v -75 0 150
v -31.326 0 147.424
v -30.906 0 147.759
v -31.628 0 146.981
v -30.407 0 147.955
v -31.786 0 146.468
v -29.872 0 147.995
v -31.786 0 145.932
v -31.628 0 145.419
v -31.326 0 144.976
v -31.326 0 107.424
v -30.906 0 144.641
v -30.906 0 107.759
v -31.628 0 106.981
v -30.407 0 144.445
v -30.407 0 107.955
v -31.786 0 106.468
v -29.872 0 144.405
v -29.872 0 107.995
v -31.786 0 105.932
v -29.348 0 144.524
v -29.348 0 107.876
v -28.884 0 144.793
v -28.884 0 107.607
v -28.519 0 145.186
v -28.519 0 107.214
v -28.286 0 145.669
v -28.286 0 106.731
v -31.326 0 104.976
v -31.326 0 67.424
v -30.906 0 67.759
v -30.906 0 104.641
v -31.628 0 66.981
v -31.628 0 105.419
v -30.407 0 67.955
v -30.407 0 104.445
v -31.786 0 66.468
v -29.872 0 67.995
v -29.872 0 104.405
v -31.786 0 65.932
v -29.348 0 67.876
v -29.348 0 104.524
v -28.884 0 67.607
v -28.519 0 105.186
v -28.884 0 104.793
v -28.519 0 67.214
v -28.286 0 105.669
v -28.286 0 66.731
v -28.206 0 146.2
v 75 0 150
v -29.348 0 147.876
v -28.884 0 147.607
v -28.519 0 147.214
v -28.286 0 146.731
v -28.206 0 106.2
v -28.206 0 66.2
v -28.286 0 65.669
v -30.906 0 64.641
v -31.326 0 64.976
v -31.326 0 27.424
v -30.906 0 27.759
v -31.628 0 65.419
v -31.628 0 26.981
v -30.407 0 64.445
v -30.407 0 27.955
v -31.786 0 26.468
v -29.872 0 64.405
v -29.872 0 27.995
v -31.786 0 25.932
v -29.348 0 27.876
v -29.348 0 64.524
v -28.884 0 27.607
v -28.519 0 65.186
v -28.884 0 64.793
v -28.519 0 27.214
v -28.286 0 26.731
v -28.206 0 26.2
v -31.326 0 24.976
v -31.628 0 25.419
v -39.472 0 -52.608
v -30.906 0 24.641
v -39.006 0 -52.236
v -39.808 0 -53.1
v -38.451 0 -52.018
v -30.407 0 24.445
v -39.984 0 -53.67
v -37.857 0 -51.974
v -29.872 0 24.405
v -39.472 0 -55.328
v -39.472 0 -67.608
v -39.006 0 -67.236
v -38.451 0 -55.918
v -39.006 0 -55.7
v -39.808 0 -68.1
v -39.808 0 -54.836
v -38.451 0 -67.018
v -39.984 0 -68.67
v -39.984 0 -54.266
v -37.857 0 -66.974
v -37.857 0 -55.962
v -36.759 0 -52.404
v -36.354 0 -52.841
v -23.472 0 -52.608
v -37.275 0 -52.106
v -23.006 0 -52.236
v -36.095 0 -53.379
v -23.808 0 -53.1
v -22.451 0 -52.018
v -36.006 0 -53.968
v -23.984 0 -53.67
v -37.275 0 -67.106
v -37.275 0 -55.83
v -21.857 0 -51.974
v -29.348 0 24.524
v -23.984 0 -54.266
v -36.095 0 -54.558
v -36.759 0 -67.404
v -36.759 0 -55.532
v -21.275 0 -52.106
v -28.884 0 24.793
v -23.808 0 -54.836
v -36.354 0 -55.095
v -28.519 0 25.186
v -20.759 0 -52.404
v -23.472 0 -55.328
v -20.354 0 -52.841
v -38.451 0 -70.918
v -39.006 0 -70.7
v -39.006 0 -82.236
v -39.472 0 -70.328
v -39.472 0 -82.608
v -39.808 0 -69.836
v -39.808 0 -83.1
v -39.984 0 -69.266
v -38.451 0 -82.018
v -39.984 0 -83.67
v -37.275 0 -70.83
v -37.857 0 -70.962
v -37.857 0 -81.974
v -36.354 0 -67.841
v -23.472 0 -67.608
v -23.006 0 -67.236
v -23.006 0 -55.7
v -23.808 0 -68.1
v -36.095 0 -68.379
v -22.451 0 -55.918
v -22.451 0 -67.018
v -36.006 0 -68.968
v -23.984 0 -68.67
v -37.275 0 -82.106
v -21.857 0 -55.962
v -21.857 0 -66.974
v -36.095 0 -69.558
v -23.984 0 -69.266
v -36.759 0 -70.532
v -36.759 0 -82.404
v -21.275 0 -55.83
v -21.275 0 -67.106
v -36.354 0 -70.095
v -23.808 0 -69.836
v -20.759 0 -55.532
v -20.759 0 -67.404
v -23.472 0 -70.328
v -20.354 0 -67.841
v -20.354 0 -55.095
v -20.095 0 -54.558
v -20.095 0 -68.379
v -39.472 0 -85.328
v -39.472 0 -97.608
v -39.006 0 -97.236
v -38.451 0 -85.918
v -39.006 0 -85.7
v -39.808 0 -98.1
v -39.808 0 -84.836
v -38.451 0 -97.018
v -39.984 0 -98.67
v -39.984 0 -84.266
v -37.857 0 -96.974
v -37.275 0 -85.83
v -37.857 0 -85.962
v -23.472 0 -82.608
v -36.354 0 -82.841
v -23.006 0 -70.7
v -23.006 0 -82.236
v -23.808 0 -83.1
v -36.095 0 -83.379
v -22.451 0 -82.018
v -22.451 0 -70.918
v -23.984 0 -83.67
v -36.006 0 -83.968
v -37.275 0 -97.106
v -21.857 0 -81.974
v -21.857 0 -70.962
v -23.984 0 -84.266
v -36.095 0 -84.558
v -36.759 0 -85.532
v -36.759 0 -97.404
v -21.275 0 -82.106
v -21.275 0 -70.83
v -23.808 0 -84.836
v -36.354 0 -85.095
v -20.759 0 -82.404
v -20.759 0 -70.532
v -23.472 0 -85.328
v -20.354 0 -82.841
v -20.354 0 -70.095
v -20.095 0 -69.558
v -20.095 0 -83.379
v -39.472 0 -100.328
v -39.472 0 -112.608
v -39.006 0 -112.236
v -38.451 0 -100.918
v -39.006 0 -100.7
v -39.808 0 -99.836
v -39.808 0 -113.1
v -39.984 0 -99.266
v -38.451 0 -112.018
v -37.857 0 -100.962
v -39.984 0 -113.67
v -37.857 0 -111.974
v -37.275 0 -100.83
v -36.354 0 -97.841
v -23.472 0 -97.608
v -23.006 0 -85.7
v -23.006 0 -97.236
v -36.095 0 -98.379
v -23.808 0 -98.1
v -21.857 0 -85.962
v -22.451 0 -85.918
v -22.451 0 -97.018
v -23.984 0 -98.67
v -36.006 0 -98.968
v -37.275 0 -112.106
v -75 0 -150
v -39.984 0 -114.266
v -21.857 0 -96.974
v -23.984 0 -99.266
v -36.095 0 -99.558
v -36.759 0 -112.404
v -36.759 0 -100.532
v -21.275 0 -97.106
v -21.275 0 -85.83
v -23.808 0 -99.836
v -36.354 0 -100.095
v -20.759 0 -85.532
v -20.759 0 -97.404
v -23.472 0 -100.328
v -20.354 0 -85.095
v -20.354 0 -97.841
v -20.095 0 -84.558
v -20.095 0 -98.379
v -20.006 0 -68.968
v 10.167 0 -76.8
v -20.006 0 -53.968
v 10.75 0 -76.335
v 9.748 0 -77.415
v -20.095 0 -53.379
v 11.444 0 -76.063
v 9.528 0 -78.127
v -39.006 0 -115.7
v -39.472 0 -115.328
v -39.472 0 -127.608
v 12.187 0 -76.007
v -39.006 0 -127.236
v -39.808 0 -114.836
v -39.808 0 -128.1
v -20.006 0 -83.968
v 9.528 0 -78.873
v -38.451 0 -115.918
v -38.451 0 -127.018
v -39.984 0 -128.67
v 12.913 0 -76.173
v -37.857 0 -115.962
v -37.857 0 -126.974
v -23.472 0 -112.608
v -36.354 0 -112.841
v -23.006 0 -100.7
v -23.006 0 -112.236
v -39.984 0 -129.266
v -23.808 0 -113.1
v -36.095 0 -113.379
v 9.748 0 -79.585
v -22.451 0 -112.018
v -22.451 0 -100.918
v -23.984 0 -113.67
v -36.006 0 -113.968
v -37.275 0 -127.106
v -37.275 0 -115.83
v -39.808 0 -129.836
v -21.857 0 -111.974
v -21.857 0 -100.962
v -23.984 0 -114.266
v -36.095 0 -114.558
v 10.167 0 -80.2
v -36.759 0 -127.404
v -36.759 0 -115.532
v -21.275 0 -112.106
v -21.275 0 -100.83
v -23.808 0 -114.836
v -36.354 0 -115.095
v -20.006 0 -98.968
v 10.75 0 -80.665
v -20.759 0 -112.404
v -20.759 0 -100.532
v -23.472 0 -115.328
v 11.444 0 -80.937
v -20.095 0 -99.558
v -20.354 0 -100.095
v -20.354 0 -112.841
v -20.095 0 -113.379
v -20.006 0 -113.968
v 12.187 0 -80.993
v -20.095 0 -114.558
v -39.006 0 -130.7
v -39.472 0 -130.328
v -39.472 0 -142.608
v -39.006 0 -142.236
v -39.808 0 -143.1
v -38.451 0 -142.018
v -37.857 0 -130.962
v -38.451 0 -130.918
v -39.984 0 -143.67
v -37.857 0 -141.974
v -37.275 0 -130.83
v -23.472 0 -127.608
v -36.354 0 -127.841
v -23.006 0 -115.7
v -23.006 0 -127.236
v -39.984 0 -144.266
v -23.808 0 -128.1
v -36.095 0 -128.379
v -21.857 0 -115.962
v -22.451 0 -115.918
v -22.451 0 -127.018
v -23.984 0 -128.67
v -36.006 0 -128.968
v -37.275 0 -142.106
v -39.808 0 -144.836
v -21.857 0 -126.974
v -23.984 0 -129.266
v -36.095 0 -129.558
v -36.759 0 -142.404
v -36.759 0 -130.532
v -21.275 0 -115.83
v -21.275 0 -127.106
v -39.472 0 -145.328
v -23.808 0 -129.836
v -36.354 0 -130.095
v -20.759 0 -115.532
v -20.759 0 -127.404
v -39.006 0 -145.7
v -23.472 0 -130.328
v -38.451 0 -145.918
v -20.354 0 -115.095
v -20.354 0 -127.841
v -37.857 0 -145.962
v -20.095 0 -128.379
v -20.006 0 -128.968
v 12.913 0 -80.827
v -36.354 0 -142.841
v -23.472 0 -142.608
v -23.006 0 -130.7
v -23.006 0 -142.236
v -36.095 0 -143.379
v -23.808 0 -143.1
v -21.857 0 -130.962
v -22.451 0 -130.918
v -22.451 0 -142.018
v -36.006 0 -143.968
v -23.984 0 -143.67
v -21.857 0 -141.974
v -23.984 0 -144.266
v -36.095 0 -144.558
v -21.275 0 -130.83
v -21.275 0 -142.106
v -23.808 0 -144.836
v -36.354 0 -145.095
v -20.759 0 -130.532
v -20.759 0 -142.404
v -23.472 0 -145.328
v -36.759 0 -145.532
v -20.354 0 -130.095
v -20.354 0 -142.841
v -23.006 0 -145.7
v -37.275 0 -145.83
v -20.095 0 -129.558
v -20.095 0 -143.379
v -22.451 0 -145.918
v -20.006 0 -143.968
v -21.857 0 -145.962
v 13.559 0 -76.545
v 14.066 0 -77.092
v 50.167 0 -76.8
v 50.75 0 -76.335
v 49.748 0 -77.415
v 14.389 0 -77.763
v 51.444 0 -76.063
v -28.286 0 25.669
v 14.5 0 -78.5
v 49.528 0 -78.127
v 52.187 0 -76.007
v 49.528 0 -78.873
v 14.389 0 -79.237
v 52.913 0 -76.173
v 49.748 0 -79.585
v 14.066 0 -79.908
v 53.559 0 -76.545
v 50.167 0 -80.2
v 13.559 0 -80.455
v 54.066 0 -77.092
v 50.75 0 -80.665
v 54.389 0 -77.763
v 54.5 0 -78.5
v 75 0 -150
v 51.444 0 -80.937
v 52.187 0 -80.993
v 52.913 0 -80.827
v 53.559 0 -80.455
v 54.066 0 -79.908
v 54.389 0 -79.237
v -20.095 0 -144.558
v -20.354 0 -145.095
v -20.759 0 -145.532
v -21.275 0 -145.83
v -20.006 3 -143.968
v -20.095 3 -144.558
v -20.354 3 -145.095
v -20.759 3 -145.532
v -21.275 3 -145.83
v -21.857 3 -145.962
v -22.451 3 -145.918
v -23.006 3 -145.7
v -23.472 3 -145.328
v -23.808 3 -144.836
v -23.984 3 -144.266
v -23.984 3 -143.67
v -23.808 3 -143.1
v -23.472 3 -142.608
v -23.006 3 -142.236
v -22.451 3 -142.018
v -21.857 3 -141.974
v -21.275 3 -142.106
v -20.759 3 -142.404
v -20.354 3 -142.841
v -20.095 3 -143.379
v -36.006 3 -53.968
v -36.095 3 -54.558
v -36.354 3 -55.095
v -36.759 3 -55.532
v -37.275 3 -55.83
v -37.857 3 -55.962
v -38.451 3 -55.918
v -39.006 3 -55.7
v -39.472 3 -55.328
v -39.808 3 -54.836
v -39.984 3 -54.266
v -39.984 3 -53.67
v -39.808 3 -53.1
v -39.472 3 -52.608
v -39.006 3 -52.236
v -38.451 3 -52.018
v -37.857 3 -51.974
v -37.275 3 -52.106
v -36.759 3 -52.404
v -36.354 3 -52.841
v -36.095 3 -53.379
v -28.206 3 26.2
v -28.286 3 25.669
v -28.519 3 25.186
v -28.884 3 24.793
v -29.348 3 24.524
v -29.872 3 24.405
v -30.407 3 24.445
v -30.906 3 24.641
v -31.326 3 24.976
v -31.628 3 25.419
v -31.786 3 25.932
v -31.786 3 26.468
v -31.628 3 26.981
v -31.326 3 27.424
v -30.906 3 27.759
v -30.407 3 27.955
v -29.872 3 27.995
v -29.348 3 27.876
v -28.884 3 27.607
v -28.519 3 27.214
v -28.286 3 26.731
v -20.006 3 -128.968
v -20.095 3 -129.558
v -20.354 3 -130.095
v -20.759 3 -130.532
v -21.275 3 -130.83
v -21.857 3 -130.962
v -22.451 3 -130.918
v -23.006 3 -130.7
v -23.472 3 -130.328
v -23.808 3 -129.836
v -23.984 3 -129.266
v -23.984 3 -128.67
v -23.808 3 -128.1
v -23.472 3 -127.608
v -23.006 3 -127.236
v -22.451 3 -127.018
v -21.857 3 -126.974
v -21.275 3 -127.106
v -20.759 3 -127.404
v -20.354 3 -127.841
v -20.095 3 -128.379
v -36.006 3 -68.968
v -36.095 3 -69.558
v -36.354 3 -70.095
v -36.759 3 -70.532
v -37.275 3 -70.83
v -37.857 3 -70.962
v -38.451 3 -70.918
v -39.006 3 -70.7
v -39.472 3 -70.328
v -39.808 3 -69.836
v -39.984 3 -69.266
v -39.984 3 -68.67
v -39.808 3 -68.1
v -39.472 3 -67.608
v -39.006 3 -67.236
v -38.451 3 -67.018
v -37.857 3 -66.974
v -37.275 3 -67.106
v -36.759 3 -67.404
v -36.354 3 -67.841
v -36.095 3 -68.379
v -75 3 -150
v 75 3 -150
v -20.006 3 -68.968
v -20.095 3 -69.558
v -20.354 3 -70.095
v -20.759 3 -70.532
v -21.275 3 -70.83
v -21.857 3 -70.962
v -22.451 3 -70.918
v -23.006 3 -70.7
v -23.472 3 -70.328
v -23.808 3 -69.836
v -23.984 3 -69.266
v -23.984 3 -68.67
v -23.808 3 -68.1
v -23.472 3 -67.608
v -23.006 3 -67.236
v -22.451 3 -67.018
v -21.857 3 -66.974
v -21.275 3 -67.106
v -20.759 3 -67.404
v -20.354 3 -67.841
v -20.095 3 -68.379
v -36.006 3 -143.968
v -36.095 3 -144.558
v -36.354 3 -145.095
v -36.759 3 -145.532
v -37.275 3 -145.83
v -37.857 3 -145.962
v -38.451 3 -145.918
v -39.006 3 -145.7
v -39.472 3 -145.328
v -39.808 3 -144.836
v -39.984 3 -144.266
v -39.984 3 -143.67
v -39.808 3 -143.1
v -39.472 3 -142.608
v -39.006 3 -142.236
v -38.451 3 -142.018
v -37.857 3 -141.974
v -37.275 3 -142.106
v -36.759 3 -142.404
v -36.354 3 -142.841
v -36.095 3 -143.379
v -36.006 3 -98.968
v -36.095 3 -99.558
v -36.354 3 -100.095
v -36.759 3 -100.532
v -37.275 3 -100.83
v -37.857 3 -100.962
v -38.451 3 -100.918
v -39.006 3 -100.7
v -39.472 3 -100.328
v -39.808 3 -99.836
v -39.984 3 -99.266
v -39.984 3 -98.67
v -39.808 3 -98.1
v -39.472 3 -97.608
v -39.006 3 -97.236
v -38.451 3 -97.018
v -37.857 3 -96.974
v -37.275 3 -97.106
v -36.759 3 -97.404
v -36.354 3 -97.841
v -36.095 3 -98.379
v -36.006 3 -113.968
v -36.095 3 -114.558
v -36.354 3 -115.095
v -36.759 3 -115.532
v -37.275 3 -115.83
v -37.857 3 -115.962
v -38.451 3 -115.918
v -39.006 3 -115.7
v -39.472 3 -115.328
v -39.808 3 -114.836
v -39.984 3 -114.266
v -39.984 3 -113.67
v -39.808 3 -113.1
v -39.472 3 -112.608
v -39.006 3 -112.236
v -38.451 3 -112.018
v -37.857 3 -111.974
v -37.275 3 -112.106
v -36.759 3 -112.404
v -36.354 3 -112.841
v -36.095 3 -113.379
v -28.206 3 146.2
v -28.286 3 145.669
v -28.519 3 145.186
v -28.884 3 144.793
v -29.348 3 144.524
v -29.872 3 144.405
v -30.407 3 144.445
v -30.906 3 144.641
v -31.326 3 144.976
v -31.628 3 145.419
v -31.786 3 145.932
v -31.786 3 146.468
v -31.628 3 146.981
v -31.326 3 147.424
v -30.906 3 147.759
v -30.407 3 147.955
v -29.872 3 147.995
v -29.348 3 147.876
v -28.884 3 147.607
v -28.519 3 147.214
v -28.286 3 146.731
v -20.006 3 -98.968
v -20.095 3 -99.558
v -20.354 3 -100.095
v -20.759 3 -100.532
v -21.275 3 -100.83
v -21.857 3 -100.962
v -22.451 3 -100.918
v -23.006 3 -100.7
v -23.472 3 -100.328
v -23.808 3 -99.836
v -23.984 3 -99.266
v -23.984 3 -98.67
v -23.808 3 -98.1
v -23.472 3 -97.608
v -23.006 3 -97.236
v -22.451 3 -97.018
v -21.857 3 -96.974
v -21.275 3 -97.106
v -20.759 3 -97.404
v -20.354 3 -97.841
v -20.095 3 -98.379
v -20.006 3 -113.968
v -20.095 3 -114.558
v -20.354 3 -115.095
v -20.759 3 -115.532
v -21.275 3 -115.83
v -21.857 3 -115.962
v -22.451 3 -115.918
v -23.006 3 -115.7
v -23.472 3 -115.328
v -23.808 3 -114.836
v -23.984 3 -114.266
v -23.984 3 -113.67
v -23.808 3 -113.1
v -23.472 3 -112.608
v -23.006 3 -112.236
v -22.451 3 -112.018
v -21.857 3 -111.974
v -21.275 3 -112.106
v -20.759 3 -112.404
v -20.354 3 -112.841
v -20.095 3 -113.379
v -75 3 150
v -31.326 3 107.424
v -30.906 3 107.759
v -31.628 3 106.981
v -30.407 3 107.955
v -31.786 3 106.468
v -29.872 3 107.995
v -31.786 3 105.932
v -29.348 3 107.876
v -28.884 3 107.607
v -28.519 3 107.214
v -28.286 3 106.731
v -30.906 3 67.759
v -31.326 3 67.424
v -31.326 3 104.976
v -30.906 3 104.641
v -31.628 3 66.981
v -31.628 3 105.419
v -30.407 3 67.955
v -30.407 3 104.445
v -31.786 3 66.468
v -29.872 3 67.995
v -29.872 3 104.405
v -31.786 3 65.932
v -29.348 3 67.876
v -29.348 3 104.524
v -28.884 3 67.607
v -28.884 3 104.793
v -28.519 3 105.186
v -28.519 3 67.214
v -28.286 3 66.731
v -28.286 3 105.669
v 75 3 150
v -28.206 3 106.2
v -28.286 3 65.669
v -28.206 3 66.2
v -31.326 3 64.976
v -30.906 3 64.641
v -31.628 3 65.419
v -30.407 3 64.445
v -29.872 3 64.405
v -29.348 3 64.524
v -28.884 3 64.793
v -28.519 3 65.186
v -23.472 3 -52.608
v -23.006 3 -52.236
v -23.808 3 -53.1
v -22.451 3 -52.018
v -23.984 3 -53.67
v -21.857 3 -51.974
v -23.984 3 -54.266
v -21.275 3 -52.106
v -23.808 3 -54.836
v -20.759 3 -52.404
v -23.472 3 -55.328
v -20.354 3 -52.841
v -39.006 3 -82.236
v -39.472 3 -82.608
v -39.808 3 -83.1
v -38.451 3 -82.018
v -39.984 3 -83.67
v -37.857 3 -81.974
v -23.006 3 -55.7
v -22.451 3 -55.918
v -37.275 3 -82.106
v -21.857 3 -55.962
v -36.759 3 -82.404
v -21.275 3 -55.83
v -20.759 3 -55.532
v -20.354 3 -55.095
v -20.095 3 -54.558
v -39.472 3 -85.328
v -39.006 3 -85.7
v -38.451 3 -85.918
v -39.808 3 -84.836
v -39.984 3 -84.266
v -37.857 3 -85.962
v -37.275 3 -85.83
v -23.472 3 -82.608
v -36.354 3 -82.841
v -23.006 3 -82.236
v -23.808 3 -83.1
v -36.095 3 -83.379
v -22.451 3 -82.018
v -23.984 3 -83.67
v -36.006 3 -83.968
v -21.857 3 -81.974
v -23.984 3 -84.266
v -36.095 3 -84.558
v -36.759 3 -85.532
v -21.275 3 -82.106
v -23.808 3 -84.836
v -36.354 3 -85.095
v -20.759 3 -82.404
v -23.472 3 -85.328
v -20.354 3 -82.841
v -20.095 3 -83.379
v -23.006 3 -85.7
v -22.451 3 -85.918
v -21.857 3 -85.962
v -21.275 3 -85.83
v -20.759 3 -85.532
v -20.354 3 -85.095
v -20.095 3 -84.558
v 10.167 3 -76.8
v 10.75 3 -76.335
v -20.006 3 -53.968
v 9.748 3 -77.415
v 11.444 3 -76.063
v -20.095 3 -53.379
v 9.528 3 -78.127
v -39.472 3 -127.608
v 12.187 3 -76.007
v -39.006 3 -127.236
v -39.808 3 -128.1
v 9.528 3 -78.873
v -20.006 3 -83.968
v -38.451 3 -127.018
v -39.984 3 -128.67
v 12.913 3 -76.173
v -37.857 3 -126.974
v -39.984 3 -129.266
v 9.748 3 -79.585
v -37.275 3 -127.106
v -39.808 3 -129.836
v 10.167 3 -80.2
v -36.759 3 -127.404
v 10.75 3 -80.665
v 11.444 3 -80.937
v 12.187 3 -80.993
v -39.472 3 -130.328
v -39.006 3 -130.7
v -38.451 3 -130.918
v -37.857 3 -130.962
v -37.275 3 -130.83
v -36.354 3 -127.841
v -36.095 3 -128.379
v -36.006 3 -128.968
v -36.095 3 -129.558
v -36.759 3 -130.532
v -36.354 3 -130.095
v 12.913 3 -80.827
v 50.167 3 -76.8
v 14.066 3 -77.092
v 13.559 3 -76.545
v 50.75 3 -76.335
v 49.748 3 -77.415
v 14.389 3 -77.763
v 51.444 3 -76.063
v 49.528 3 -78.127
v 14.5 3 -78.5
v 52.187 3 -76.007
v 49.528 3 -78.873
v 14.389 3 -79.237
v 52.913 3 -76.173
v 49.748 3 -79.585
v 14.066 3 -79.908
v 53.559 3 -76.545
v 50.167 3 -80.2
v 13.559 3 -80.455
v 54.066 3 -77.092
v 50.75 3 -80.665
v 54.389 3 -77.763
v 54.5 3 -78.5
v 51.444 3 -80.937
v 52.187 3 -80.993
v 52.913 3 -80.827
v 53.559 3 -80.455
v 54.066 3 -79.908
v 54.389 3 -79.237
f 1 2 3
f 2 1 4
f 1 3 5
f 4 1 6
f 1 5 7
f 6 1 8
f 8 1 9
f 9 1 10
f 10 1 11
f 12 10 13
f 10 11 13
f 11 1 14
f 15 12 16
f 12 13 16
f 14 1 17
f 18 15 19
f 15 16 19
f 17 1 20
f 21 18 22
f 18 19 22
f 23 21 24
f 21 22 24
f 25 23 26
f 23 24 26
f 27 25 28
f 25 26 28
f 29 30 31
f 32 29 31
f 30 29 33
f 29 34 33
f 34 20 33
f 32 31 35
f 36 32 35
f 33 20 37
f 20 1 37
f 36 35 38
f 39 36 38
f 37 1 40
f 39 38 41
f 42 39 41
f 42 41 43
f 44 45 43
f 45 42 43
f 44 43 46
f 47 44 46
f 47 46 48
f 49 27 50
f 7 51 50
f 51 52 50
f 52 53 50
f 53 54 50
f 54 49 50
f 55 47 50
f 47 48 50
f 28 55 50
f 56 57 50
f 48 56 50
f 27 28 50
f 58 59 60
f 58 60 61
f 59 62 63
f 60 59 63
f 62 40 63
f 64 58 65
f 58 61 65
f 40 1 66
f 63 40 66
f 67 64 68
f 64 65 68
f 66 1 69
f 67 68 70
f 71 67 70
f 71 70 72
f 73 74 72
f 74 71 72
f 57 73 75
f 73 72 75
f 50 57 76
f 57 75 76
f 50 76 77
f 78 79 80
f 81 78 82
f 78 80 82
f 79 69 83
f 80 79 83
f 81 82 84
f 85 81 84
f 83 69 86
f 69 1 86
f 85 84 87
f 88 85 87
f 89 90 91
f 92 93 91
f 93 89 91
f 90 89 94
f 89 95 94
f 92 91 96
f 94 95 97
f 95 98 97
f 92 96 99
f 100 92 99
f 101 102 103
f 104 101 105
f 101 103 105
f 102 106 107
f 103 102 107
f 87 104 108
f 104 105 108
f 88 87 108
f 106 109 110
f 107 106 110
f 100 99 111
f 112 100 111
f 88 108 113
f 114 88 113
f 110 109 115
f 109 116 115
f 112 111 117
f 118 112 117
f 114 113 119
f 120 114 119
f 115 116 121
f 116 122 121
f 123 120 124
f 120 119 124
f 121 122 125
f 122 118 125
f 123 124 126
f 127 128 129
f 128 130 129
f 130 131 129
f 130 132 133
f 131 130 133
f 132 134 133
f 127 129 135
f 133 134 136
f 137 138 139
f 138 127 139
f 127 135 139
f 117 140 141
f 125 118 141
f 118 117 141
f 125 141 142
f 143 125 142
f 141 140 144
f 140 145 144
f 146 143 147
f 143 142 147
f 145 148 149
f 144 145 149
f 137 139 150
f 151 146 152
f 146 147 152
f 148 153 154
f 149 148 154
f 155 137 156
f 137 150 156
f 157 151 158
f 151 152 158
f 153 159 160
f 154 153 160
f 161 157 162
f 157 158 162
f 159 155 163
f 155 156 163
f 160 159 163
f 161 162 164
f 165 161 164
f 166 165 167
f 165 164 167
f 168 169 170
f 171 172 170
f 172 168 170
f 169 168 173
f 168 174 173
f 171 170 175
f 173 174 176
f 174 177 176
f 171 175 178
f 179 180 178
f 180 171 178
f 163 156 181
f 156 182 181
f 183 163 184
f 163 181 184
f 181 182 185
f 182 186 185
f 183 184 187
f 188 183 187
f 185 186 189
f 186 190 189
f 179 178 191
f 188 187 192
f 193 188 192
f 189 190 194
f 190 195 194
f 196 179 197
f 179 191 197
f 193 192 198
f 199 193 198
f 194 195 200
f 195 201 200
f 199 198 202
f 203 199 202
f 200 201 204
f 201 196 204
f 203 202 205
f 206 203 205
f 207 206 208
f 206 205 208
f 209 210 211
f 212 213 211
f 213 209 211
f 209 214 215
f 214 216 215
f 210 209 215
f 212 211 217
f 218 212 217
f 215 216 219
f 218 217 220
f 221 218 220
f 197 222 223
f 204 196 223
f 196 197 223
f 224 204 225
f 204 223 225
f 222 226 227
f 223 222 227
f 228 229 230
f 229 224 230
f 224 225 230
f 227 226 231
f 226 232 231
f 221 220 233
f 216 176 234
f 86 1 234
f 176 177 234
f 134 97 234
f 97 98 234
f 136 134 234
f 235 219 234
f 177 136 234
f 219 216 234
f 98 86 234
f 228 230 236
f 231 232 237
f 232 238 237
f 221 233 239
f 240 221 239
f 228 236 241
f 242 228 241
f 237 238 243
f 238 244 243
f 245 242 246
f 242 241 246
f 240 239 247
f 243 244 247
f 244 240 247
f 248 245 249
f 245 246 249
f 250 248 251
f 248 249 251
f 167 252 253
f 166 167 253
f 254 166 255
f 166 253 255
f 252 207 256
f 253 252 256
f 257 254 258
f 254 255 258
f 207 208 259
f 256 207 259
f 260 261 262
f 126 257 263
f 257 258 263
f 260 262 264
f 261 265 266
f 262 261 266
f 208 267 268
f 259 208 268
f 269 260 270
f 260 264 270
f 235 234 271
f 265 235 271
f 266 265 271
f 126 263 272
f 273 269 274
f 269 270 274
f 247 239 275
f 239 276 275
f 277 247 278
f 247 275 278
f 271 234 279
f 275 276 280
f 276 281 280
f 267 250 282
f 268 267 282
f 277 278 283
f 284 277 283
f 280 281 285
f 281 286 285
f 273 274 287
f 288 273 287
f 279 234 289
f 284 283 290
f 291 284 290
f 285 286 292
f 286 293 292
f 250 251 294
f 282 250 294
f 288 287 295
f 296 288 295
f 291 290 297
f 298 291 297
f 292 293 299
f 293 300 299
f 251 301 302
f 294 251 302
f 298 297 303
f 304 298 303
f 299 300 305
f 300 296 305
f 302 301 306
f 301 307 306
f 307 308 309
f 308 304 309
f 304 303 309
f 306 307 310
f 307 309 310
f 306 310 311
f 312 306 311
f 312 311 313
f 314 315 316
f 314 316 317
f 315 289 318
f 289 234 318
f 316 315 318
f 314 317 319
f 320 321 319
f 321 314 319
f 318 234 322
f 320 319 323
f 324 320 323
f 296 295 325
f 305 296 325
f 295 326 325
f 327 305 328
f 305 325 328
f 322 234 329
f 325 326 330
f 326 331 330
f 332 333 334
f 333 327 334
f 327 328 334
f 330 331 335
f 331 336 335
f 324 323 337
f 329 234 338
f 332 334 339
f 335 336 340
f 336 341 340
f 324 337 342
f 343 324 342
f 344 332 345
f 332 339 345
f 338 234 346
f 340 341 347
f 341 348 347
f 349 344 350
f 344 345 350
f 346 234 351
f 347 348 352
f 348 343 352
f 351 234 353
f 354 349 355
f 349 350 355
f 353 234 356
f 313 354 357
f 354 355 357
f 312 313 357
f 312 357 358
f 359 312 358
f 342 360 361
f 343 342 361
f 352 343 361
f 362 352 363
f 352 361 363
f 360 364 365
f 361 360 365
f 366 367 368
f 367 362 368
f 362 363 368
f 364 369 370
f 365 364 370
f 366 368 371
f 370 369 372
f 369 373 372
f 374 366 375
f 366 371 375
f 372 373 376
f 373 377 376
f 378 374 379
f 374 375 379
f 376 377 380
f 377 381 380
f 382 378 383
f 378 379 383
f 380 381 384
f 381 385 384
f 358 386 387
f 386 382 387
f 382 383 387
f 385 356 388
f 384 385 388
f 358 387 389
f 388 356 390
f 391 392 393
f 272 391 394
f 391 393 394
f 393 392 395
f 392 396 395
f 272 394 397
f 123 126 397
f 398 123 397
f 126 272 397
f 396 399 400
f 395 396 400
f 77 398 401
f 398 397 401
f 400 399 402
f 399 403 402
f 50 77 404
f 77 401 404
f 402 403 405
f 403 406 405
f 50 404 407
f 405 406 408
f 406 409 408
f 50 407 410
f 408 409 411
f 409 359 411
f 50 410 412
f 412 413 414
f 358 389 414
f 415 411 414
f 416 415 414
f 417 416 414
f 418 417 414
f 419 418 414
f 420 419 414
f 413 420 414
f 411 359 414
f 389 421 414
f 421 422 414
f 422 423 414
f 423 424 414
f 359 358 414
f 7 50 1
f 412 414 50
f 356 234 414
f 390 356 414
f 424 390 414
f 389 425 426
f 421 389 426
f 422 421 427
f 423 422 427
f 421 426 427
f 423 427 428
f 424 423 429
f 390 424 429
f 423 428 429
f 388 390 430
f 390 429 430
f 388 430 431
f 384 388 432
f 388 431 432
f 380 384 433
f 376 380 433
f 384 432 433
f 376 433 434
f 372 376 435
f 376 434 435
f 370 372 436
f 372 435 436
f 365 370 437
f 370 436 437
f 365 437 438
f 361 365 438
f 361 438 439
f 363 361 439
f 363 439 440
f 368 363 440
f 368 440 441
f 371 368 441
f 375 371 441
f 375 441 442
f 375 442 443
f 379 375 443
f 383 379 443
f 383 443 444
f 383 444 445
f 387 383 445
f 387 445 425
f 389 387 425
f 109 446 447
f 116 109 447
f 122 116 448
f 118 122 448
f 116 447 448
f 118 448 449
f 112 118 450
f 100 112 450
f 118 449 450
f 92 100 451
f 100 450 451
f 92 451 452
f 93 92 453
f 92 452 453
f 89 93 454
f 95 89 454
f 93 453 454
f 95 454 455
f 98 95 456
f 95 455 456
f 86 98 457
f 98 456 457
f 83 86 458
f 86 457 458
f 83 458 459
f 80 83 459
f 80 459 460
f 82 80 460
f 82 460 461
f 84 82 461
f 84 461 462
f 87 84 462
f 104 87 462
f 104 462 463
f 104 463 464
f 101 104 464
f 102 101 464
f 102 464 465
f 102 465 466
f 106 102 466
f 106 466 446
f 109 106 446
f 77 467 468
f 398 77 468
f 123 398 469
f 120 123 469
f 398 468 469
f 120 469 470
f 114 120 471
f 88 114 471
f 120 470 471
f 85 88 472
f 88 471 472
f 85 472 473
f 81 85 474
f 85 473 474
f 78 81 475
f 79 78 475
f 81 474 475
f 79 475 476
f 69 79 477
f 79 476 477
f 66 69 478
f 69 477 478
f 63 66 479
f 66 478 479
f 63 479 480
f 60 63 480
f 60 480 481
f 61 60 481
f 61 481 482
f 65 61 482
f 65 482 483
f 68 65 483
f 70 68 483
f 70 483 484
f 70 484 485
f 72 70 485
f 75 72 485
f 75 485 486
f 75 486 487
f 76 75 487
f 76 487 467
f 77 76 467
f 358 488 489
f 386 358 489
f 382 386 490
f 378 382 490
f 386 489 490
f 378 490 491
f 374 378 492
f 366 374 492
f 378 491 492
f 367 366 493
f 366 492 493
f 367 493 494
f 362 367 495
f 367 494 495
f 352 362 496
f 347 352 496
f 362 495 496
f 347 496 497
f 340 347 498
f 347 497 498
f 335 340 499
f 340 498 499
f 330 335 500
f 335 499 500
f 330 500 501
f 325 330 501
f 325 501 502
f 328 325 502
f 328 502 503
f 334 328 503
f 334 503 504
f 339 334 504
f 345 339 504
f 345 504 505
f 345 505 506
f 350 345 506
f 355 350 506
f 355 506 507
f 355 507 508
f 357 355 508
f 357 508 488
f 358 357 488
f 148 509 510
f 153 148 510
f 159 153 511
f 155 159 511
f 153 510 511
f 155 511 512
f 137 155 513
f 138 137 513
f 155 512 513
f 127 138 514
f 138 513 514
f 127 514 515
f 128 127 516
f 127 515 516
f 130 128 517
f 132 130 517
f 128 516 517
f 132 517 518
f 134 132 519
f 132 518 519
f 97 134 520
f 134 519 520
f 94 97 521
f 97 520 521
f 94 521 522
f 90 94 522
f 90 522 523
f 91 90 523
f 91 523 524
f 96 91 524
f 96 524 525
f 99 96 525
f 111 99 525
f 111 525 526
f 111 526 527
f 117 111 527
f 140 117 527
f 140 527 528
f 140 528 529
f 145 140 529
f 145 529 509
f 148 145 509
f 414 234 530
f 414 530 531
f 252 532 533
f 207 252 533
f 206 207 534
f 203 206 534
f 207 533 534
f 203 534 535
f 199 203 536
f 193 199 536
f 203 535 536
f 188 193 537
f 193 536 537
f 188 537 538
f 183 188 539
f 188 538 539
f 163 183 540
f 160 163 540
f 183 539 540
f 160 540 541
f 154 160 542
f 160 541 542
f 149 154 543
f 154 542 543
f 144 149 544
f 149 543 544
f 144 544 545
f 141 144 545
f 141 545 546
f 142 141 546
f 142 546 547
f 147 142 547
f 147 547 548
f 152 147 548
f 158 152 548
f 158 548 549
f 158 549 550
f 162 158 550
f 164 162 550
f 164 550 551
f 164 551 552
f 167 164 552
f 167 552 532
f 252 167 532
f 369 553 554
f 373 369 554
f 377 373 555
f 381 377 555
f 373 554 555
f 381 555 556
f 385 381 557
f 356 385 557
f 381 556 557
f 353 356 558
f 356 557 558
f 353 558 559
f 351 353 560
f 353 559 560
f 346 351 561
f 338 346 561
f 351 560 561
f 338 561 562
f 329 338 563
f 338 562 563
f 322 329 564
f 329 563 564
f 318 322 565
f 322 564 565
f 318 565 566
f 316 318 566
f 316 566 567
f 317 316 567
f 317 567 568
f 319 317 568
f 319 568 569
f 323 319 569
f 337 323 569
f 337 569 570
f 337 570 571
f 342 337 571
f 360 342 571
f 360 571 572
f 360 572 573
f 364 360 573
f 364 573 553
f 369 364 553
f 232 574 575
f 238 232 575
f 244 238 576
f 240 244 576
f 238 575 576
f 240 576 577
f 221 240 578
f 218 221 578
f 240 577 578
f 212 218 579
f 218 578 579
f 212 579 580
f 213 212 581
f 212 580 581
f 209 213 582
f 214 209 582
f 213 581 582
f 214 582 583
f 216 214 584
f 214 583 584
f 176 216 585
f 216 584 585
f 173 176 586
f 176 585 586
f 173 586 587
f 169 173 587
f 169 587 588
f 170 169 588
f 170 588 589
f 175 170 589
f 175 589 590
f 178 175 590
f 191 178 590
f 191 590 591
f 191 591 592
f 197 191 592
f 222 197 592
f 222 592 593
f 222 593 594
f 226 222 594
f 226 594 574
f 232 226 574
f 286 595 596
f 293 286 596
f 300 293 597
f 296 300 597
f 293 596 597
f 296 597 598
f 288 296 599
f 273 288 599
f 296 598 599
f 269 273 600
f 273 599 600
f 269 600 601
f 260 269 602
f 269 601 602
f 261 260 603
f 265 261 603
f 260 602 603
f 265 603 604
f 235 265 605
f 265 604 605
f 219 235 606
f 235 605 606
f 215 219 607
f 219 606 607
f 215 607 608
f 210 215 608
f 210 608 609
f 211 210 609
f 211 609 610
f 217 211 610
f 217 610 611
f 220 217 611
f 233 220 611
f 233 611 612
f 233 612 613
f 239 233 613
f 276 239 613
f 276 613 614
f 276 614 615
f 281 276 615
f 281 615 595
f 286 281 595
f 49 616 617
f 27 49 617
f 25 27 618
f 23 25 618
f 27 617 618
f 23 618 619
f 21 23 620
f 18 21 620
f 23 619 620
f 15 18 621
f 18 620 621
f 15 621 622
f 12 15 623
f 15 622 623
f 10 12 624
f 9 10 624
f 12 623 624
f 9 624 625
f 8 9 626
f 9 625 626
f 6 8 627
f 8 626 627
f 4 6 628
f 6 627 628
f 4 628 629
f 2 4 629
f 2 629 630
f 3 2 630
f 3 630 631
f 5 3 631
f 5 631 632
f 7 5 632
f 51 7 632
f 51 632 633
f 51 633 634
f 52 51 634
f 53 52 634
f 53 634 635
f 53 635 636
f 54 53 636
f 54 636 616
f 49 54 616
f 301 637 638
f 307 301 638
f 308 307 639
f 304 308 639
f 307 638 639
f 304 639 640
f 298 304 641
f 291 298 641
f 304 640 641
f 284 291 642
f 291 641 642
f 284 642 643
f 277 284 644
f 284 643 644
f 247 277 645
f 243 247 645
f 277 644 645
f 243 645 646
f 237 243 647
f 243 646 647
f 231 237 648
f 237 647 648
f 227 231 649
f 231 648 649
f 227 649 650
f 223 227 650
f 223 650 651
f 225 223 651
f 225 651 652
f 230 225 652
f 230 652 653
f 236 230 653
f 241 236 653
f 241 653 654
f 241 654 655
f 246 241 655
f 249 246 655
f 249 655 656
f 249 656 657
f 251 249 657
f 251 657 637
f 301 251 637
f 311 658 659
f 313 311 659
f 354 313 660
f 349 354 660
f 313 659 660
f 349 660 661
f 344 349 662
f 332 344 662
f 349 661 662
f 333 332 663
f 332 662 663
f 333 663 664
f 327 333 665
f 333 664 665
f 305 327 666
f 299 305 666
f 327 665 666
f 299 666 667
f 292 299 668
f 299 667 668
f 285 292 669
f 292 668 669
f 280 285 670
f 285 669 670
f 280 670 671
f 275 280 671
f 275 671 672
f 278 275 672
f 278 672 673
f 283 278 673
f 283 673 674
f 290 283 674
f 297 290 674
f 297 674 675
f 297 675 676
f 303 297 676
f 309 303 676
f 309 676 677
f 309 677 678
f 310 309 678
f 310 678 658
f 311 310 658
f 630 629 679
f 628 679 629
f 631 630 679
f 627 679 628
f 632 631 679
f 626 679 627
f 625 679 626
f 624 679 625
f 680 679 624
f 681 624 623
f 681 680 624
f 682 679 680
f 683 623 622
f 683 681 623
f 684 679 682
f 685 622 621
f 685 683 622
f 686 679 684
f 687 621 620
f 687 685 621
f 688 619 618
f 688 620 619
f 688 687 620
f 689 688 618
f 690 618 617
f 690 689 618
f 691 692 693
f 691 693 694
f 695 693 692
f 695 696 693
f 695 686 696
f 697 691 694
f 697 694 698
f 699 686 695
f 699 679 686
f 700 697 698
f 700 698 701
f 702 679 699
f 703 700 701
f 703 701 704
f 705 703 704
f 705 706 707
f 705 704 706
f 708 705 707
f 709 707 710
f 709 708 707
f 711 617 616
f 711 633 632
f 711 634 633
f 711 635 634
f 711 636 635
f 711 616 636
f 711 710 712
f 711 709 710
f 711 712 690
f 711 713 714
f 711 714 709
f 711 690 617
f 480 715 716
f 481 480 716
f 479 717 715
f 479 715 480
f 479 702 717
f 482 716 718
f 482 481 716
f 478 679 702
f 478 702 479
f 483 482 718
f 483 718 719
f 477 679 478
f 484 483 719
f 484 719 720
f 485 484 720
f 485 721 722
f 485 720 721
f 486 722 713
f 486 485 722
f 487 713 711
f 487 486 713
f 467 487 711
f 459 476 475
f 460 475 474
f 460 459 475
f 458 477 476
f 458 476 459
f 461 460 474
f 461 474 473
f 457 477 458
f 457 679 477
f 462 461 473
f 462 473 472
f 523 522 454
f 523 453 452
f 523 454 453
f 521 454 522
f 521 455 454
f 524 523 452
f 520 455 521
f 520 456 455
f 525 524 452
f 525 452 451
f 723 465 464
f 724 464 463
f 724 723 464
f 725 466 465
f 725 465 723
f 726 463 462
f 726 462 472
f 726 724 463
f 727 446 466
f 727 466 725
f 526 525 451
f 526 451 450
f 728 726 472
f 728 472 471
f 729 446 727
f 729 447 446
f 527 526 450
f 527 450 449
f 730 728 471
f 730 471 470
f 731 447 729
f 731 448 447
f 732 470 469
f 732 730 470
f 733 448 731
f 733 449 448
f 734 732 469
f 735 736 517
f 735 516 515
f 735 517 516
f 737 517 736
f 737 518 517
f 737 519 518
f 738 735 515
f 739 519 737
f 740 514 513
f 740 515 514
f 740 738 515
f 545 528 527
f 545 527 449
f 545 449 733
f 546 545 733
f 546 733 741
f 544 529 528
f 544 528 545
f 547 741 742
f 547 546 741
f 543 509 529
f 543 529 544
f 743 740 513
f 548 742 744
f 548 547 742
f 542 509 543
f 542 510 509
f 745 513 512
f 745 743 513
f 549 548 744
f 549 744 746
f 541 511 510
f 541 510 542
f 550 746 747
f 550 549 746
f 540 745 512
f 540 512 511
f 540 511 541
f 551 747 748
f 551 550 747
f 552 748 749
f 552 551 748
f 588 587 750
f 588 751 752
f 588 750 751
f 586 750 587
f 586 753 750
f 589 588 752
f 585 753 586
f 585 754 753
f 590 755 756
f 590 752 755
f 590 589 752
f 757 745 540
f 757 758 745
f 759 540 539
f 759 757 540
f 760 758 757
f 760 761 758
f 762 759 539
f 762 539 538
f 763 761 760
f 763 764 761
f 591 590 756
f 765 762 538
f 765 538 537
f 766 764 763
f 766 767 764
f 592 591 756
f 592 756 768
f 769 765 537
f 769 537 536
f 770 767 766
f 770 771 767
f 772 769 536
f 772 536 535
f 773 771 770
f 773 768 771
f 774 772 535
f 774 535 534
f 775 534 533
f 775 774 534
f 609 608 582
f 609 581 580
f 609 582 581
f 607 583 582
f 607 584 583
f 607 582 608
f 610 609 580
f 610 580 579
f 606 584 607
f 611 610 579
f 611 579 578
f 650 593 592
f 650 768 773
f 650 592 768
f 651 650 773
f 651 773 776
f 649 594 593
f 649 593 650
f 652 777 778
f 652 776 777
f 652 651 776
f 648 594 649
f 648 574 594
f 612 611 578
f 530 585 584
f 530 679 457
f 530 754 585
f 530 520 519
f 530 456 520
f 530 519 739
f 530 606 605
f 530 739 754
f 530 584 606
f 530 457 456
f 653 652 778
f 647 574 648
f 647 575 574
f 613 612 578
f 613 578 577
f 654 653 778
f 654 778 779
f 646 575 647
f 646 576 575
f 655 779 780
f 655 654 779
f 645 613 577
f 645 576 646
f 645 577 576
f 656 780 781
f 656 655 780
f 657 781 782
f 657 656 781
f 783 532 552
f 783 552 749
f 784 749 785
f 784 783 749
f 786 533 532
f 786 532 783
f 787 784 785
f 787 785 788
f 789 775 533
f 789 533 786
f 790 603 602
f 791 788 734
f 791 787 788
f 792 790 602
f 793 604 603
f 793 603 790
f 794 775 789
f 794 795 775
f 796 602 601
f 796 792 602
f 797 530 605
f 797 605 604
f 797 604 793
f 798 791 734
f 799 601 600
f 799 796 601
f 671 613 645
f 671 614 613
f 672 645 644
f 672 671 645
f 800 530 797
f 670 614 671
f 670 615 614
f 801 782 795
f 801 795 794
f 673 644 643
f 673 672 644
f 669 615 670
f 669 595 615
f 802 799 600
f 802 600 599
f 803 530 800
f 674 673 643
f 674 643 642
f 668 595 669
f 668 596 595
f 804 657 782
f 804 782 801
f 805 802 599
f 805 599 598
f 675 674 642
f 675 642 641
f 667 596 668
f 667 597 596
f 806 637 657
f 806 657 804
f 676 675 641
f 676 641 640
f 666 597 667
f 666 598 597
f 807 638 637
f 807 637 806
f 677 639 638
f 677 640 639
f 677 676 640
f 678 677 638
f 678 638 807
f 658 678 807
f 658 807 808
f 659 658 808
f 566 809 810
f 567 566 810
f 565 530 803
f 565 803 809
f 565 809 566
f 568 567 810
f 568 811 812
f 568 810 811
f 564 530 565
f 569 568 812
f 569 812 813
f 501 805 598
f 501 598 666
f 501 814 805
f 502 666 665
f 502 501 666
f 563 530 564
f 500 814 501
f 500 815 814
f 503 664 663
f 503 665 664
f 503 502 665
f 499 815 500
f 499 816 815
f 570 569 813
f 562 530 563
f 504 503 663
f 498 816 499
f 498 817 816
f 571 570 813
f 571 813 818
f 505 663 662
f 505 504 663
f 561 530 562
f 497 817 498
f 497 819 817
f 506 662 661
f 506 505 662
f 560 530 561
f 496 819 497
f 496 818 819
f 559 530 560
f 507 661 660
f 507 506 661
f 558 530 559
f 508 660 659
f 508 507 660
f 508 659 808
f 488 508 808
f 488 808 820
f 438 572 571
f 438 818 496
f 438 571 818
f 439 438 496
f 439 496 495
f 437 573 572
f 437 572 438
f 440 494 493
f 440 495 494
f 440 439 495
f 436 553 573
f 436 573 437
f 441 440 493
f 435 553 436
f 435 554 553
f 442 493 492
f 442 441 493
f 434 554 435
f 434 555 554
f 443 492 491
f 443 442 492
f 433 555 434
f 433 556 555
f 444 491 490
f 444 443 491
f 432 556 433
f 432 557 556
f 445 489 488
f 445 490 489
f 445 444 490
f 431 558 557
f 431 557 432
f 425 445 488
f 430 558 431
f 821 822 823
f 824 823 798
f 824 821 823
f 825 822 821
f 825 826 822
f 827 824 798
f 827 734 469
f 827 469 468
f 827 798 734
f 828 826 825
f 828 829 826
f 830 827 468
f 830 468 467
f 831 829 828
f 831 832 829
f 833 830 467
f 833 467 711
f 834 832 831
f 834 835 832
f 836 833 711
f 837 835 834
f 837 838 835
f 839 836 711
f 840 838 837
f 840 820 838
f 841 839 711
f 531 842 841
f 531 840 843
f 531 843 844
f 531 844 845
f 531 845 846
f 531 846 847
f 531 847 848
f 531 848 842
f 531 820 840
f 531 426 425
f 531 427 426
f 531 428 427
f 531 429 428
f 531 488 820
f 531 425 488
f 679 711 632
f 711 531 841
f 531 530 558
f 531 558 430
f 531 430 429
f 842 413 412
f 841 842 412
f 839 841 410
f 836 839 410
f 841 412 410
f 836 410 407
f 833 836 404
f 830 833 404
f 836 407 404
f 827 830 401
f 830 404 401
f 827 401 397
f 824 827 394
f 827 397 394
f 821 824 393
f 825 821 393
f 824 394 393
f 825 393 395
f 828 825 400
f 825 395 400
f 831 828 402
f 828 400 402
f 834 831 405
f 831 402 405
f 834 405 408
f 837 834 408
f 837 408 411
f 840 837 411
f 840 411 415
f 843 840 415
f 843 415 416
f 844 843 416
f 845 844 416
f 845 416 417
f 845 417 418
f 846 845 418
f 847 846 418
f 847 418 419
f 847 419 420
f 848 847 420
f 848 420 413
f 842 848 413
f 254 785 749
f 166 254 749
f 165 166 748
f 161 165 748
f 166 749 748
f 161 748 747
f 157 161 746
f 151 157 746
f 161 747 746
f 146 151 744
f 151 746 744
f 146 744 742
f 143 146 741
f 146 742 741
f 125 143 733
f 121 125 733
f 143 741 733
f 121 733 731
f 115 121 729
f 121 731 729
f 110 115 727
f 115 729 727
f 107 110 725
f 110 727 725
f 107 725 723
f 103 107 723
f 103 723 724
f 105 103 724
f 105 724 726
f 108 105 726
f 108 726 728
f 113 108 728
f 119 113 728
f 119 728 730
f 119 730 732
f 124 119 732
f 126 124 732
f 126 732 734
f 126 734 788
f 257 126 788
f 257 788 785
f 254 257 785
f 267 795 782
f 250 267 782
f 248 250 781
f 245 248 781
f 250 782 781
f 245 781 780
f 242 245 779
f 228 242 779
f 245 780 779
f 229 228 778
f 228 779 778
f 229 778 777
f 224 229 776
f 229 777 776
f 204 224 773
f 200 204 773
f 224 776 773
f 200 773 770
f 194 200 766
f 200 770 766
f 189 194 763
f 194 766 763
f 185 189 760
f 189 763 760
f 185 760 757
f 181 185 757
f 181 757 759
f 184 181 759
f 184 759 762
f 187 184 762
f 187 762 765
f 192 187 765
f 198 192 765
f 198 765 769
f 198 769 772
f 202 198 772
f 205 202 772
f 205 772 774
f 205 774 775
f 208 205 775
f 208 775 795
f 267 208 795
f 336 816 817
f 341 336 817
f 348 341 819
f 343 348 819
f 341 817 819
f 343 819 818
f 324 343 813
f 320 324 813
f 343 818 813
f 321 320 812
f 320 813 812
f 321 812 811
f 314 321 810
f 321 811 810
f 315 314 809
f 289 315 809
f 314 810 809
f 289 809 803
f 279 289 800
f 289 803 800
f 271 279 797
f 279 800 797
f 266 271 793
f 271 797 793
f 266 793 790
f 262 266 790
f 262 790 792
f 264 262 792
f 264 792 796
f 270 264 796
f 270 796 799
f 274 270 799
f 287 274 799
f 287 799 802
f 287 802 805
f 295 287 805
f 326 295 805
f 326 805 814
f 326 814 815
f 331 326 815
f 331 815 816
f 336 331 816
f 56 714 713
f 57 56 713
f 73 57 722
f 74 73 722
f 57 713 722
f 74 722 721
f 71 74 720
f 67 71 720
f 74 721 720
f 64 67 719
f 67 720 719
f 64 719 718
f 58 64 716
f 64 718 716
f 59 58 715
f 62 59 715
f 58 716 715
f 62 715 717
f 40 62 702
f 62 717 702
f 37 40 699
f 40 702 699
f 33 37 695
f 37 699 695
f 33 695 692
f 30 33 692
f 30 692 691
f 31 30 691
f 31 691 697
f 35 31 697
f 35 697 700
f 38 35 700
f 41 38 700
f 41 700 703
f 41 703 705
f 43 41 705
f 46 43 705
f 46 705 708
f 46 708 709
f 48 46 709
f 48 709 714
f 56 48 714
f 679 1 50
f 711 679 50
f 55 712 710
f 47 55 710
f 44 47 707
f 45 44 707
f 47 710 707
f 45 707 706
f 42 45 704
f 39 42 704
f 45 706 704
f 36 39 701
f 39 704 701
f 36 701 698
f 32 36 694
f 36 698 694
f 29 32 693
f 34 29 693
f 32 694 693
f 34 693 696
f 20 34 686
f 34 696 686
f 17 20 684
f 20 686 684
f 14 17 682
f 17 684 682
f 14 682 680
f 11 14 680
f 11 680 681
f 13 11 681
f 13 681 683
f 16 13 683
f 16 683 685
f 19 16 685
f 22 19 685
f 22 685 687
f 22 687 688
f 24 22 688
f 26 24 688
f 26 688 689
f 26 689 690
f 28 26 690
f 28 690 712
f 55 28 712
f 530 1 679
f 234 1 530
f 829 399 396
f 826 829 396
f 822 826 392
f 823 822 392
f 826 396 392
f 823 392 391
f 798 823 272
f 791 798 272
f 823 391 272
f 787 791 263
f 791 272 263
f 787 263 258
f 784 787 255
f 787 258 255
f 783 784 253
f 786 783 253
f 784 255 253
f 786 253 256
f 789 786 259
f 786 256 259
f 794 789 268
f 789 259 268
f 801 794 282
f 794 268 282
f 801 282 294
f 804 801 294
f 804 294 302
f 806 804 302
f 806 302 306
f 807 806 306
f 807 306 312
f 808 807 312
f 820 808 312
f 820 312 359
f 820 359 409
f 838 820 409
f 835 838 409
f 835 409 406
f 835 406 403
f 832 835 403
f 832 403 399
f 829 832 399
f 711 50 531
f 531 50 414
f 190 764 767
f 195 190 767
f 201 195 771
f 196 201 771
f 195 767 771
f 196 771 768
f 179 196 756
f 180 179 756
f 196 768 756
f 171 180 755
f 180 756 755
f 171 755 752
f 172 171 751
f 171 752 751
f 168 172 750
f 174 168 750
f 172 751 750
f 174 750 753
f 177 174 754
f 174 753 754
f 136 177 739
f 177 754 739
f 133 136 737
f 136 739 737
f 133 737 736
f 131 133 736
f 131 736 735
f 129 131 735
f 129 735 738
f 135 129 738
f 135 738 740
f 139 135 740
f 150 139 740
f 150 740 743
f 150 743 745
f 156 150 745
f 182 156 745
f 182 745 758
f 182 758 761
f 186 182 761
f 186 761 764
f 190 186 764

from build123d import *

# Parameters (mm, degrees)
SKETCH1_W           = 150
SKETCH1_H           = 300
BOSS_EXTRUDE1_DEPTH = 3
SKETCH2_R           = 2.5
CUT_EXTRUDE1_DEPTH  = 10
SKETCH3_R           = 1.8
CUT_EXTRUDE2_DEPTH  = 10
SKETCH4_R           = 2
CUT_EXTRUDE3_DEPTH  = 8.5
SKETCH5_R           = 2
CUT_EXTRUDE4_DEPTH  = 10


with BuildPart() as part:
    # Sketch1 → Boss-Extrude1 (new body)
    with BuildSketch(Plane(origin=(0, 0, 0), x_dir=(1, 0, 0), z_dir=(0, 1, 0))):
        Rectangle(SKETCH1_W, SKETCH1_H)
    extrude(amount=BOSS_EXTRUDE1_DEPTH)

    # Sketch2 → Cut-Extrude1 (cut)
    with BuildSketch(Plane.XZ):
        with Locations((52, -78.5)):
            Circle(SKETCH2_R)
        with Locations((12, -78.5)):
            Circle(SKETCH2_R)
    extrude(amount=-CUT_EXTRUDE1_DEPTH, mode=Mode.SUBTRACT)

    # Sketch3 → Cut-Extrude2 (cut)
    with BuildSketch(Plane(origin=(0, 3, 0), x_dir=(1, 0, 0), z_dir=(0, 1, 0))):
        with Locations((-30.006048092, -146.2)):
            Circle(SKETCH3_R)
        with Locations((-30.006048092, -106.2)):
            Circle(SKETCH3_R)
        with Locations((-30.006048092, -66.2)):
            Circle(SKETCH3_R)
        with Locations((-30.006048092, -26.2)):
            Circle(SKETCH3_R)
    extrude(amount=-CUT_EXTRUDE2_DEPTH, mode=Mode.SUBTRACT)

    # Sketch4 → Cut-Extrude3 (cut)
    with BuildSketch(Plane(origin=(0, 3, 0), x_dir=(1, 0, 0), z_dir=(0, 1, 0))):
        with Locations((-38.006048092, 53.968085801)):
            Circle(SKETCH4_R)
        with Locations((-22.006048092, 53.968085801)):
            Circle(SKETCH4_R)
    extrude(amount=-CUT_EXTRUDE3_DEPTH, mode=Mode.SUBTRACT)

    # Sketch5 → Cut-Extrude4 (cut)
    with BuildSketch(Plane(origin=(0, 3, 0), x_dir=(1, 0, 0), z_dir=(0, 1, 0))):
        with Locations((-38.006048092, 68.968085801)):
            Circle(SKETCH5_R)
        with Locations((-22.006048092, 68.968085801)):
            Circle(SKETCH5_R)
        with Locations((-38.006048092, 83.968085801)):
            Circle(SKETCH5_R)
        with Locations((-22.006048092, 83.968085801)):
            Circle(SKETCH5_R)
        with Locations((-38.006048092, 98.968085801)):
            Circle(SKETCH5_R)
        with Locations((-22.006048092, 98.968085801)):
            Circle(SKETCH5_R)
        with Locations((-38.006048092, 113.968085801)):
            Circle(SKETCH5_R)
        with Locations((-22.006048092, 113.968085801)):
            Circle(SKETCH5_R)
        with Locations((-38.006048092, 128.968085801)):
            Circle(SKETCH5_R)
        with Locations((-22.006048092, 128.968085801)):
            Circle(SKETCH5_R)
        with Locations((-38.006048092, 143.968085801)):
            Circle(SKETCH5_R)
        with Locations((-22.006048092, 143.968085801)):
            Circle(SKETCH5_R)
    extrude(amount=-CUT_EXTRUDE4_DEPTH, mode=Mode.SUBTRACT)


solid = part.part
